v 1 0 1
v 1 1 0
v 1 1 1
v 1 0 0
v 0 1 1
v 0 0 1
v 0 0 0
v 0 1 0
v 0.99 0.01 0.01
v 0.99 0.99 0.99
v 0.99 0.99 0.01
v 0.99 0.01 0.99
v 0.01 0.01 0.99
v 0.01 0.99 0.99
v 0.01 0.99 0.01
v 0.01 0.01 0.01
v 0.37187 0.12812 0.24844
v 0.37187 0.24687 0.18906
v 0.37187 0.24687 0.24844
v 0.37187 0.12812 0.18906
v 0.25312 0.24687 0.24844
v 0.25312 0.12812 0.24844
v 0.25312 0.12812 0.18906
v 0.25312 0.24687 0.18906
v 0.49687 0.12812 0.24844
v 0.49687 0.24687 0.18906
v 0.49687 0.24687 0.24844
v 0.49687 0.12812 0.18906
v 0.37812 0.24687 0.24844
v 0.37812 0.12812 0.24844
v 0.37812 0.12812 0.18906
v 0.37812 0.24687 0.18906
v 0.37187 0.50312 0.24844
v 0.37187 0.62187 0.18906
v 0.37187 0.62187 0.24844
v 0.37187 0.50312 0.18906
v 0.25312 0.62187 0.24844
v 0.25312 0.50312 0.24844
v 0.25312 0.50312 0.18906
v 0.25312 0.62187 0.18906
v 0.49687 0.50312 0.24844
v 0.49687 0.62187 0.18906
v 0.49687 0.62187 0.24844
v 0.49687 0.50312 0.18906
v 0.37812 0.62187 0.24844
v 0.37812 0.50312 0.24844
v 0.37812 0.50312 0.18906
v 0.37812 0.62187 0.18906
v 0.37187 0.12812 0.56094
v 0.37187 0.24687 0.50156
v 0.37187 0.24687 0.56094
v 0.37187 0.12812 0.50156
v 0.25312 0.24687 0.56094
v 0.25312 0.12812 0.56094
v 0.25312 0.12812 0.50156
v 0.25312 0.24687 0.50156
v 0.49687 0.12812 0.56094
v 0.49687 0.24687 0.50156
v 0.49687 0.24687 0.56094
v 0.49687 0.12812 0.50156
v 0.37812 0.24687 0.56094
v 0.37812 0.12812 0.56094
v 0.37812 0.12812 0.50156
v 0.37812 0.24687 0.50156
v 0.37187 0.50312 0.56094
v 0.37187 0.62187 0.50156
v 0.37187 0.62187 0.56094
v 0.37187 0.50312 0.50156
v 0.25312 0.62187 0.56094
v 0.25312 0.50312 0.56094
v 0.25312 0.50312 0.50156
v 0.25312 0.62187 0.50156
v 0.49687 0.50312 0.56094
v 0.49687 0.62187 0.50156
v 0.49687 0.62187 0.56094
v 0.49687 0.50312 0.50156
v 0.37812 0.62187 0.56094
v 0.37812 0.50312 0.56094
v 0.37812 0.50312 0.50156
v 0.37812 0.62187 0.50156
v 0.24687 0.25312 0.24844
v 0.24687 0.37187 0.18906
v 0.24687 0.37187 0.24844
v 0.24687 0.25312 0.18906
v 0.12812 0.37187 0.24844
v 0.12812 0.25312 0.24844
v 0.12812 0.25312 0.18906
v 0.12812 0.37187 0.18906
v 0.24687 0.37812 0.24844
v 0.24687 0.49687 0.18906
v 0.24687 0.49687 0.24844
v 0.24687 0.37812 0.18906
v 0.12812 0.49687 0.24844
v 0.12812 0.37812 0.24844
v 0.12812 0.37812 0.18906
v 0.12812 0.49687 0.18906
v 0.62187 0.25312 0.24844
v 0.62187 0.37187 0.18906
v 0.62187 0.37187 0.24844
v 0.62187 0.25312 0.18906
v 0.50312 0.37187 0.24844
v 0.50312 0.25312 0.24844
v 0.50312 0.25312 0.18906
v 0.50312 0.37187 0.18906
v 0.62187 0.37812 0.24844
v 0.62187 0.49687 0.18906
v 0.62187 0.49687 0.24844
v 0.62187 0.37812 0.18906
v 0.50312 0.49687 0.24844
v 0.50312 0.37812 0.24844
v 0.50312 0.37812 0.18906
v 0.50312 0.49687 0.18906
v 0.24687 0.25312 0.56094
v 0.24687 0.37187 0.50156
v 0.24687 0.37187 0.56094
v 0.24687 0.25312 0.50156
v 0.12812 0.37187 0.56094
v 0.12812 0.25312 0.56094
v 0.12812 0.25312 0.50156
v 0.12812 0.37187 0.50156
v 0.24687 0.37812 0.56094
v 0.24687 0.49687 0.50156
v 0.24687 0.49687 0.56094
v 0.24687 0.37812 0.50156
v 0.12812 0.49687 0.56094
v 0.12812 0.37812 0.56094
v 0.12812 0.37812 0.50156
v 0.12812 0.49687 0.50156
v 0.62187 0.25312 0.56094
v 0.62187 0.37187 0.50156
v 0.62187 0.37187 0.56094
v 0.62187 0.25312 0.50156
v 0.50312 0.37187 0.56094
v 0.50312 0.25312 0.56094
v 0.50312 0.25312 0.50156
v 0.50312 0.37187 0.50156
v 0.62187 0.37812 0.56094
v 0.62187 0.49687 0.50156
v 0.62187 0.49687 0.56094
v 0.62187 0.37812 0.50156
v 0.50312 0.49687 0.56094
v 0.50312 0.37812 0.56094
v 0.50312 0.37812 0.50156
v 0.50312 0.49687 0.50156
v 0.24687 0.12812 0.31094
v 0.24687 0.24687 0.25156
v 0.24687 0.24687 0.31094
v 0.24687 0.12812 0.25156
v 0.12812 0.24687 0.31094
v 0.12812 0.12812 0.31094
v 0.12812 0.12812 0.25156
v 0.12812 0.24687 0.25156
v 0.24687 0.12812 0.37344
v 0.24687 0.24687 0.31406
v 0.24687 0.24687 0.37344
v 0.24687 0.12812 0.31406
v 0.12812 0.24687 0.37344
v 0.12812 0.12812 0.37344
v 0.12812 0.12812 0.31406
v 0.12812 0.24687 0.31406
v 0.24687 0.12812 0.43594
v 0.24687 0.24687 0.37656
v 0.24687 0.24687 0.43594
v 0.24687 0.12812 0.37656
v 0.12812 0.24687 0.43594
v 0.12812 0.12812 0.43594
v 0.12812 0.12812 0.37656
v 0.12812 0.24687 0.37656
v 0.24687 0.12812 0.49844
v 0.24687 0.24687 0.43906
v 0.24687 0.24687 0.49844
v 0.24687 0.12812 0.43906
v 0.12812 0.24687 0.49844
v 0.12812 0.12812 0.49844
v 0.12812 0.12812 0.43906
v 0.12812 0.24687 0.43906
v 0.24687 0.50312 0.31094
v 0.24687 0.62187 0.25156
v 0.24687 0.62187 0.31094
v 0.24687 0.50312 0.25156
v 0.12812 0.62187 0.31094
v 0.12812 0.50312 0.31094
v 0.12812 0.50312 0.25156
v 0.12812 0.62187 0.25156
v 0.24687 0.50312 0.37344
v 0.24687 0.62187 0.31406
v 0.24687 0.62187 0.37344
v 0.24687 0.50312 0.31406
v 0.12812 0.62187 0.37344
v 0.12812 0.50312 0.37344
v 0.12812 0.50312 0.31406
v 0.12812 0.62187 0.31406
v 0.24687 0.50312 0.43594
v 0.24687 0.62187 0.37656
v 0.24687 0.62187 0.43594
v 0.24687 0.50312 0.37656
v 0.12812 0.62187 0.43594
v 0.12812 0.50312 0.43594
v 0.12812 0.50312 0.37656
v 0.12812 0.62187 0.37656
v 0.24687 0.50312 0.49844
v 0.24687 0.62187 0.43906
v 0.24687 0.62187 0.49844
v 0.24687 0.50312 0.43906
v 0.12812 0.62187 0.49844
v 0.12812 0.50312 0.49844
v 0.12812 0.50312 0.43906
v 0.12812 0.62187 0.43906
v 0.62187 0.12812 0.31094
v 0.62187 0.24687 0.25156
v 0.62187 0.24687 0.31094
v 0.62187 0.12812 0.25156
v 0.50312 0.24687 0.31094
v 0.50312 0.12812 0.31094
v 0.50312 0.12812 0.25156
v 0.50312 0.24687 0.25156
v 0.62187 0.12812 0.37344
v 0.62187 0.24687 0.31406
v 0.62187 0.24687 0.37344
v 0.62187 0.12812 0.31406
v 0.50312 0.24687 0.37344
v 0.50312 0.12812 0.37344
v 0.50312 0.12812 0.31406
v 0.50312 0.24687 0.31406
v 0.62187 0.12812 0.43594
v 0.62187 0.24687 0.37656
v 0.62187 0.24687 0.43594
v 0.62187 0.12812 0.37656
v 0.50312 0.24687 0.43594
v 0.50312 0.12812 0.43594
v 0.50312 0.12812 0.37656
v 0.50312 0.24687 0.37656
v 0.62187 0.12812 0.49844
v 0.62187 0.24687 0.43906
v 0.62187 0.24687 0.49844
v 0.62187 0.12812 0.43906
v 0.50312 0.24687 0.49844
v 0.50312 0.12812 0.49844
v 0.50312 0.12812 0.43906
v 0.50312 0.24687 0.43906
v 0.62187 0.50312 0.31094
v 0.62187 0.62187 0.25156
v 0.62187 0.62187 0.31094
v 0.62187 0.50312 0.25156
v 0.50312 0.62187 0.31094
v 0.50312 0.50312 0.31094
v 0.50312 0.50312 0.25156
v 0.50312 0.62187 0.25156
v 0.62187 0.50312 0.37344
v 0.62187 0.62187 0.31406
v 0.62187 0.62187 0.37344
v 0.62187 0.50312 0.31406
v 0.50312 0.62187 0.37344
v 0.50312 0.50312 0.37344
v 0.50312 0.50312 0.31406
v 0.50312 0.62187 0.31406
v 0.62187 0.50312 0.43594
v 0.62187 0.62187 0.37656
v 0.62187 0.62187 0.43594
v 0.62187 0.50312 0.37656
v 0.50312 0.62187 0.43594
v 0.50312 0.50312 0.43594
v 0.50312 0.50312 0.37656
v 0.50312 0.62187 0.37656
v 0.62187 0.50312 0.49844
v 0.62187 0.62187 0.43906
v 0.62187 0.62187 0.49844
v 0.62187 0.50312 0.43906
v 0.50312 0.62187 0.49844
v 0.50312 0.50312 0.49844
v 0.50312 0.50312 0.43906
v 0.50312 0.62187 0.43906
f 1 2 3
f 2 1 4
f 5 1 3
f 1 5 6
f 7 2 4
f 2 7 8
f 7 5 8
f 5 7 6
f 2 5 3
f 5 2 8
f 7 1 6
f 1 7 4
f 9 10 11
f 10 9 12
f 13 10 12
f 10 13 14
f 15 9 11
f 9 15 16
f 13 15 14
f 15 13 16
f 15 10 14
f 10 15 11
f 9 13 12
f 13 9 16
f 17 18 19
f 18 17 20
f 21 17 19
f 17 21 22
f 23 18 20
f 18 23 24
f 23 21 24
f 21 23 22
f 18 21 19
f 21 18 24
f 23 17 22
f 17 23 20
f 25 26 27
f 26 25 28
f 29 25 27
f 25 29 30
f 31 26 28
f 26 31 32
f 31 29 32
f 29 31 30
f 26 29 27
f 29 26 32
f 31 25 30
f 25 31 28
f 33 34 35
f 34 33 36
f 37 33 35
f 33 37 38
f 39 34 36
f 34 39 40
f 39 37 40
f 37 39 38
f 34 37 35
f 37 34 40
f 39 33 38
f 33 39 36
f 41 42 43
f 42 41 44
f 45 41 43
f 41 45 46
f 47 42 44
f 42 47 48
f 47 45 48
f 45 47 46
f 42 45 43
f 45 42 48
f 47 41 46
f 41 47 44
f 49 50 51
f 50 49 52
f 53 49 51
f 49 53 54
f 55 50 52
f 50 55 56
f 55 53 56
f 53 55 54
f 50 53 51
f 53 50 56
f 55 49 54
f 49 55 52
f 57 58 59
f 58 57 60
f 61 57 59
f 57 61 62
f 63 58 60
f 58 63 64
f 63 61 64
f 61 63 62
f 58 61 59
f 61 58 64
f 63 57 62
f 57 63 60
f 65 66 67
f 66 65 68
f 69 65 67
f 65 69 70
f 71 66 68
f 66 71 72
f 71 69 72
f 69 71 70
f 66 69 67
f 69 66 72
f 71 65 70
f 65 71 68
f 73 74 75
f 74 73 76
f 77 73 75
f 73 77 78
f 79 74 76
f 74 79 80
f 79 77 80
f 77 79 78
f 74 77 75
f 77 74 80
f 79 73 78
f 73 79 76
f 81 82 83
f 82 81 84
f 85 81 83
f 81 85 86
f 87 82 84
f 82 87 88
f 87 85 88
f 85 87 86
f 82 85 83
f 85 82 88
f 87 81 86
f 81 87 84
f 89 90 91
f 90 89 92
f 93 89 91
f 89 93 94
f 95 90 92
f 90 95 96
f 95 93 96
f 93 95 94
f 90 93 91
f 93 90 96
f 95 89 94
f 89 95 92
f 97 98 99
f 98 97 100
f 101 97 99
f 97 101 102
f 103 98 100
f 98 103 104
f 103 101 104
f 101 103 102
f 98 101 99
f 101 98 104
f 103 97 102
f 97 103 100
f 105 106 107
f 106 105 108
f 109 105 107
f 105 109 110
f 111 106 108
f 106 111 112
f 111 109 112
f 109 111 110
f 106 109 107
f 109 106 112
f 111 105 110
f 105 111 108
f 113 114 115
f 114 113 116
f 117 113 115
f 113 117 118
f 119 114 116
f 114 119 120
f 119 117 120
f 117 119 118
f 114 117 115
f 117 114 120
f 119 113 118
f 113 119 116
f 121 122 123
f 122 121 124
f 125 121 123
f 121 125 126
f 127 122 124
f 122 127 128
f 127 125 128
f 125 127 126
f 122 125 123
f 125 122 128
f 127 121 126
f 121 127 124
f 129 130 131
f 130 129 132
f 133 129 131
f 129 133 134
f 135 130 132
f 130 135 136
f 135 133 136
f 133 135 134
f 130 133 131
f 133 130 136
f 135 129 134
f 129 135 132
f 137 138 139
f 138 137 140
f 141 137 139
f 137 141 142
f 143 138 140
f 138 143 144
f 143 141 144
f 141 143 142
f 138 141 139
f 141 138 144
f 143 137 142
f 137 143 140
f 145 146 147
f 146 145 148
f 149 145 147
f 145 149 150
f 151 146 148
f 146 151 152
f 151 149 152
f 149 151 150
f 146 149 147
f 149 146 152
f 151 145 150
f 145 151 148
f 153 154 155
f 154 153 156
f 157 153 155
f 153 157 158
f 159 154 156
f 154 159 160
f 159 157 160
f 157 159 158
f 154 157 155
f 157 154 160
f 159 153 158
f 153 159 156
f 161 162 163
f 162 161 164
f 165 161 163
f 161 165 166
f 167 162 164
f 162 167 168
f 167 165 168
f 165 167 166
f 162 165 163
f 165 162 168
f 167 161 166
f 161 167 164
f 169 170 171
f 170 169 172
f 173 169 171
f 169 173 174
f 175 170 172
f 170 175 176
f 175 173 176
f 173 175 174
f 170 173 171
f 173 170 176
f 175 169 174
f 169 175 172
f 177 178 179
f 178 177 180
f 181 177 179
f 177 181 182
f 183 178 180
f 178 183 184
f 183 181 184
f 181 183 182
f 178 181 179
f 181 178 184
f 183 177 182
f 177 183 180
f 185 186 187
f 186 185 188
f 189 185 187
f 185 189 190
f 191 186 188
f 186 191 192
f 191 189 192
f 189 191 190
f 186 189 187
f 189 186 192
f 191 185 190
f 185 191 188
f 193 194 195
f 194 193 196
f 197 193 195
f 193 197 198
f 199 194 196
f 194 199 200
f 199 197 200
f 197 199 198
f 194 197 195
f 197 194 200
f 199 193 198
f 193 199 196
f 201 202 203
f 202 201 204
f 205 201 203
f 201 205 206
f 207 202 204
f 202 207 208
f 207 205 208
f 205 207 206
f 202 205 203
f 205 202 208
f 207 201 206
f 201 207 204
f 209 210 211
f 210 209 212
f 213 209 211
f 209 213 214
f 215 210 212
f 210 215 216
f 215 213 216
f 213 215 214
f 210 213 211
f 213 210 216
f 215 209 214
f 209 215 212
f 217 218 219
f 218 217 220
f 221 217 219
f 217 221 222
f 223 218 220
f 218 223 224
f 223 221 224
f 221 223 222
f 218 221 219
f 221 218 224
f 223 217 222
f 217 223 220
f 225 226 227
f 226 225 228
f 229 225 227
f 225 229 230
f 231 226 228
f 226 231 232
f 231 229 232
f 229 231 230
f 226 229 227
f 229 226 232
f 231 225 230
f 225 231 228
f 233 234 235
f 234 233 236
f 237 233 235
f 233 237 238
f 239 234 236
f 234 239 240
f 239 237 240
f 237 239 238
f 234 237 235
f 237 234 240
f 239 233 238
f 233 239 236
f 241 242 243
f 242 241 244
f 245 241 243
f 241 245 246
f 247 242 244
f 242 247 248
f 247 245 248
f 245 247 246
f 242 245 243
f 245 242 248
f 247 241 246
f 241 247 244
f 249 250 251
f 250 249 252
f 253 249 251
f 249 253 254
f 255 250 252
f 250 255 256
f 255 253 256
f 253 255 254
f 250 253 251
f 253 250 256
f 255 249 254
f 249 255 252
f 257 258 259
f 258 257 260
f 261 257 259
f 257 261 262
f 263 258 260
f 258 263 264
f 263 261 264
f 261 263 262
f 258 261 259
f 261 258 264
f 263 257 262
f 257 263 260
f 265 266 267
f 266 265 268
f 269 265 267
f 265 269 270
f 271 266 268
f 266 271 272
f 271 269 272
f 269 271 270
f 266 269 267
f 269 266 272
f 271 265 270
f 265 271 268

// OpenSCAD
translate([0.3125, 0.1875, 0.21875]) color([0.6037583803803824, 0.09238807015612271, 0.4419558762620379]) cube([0.11875, 0.11875, 0.059375], center=true);
translate([0.4375, 0.1875, 0.21875]) color([0.6420780553975034, 0.6088601398564771, 0.7006829729581248]) cube([0.11875, 0.11875, 0.059375], center=true);
translate([0.3125, 0.5625, 0.21875]) color([0.7581305576304872, 0.007750557804180436, 0.3766814086539222]) cube([0.11875, 0.11875, 0.059375], center=true);
translate([0.4375, 0.5625, 0.21875]) color([0.5480572348527447, 0.764494351432422, 0.23597579287557113]) cube([0.11875, 0.11875, 0.059375], center=true);
translate([0.3125, 0.1875, 0.53125]) color([0.2693649322151713, 0.2694086766238075, 0.6958796859861389]) cube([0.11875, 0.11875, 0.059375], center=true);
translate([0.4375, 0.1875, 0.53125]) color([0.25761969812780583, 0.5682717090181436, 0.22865906317287465]) cube([0.11875, 0.11875, 0.059375], center=true);
translate([0.3125, 0.5625, 0.53125]) color([0.1400455665979884, 0.021159789998606793, 0.7153680697513951]) cube([0.11875, 0.11875, 0.059375], center=true);
translate([0.4375, 0.5625, 0.53125]) color([0.901009207148188, 0.2844876572861873, 0.634268133483926]) cube([0.11875, 0.11875, 0.059375], center=true);
translate([0.1875, 0.3125, 0.21875]) color([0.7727777887413428, 0.029821551784454114, 0.23525397340278087]) cube([0.11875, 0.11875, 0.059375], center=true);
translate([0.1875, 0.4375, 0.21875]) color([0.29625533864232734, 0.987650008265469, 0.04068443442601799]) cube([0.11875, 0.11875, 0.059375], center=true);
translate([0.5625, 0.3125, 0.21875]) color([0.22341283147923674, 0.40291300475301783, 0.6189361131964184]) cube([0.11875, 0.11875, 0.059375], center=true);
translate([0.5625, 0.4375, 0.21875]) color([0.32098093132393746, 0.5382746099882824, 0.8431342716015308]) cube([0.11875, 0.11875, 0.059375], center=true);
translate([0.1875, 0.3125, 0.53125]) color([0.12127558406527117, 0.7951164917864636, 0.39223977748645245]) cube([0.11875, 0.11875, 0.059375], center=true);
translate([0.1875, 0.4375, 0.53125]) color([0.8130994088483475, 0.15894878261464274, 0.9790192350809205]) cube([0.11875, 0.11875, 0.059375], center=true);
translate([0.5625, 0.3125, 0.53125]) color([0.8594904379198878, 0.527164370948916, 0.6281707866208207]) cube([0.11875, 0.11875, 0.059375], center=true);
translate([0.5625, 0.4375, 0.53125]) color([0.287973529133251, 0.886126437430738, 0.5869840703034822]) cube([0.11875, 0.11875, 0.059375], center=true);
translate([0.1875, 0.1875, 0.28125]) color([0.43596179780365907, 0.27777227278728744, 0.14933550433499432]) cube([0.11875, 0.11875, 0.059375], center=true);
translate([0.1875, 0.1875, 0.34375]) color([0.24214575376493663, 0.7099966356239097, 0.23619105890966297]) cube([0.11875, 0.11875, 0.059375], center=true);
translate([0.1875, 0.1875, 0.40625]) color([0.9484277570129899, 0.016239817055838657, 0.005610540076387949]) cube([0.11875, 0.11875, 0.059375], center=true);
translate([0.1875, 0.1875, 0.46875]) color([0.0970230099071091, 0.2795817869139515, 0.16811954627213588]) cube([0.11875, 0.11875, 0.059375], center=true);
translate([0.1875, 0.5625, 0.28125]) color([0.25092783002109176, 0.8587529002767683, 0.8440271640533732]) cube([0.11875, 0.11875, 0.059375], center=true);
translate([0.1875, 0.5625, 0.34375]) color([0.3332331778602836, 0.5745321225009682, 0.597981660562659]) cube([0.11875, 0.11875, 0.059375], center=true);
translate([0.1875, 0.5625, 0.40625]) color([0.08701921327081541, 0.5549385198079445, 0.2882594546124603]) cube([0.11875, 0.11875, 0.059375], center=true);
translate([0.1875, 0.5625, 0.46875]) color([0.04706486917389552, 0.8755978412272422, 0.2767090522626785]) cube([0.11875, 0.11875, 0.059375], center=true);
translate([0.5625, 0.1875, 0.28125]) color([0.05516803830106254, 0.46174511102973437, 0.7545684835431763]) cube([0.11875, 0.11875, 0.059375], center=true);
translate([0.5625, 0.1875, 0.34375]) color([0.9296410941751805, 0.09779858722067658, 0.6642861600569387]) cube([0.11875, 0.11875, 0.059375], center=true);
translate([0.5625, 0.1875, 0.40625]) color([0.4824392270731599, 0.8361939221877871, 0.8310992059871917]) cube([0.11875, 0.11875, 0.059375], center=true);
translate([0.5625, 0.1875, 0.46875]) color([0.9392596196232026, 0.12297518776699823, 0.9119465849354247]) cube([0.11875, 0.11875, 0.059375], center=true);
translate([0.5625, 0.5625, 0.28125]) color([0.6861712480416268, 0.26385439008870304, 0.536183529695636]) cube([0.11875, 0.11875, 0.059375], center=true);
translate([0.5625, 0.5625, 0.34375]) color([0.028230652789332455, 0.6052676826541201, 0.369439565835034]) cube([0.11875, 0.11875, 0.059375], center=true);
translate([0.5625, 0.5625, 0.40625]) color([0.45153480987563877, 0.48698698819473707, 0.28726291748041466]) cube([0.11875, 0.11875, 0.059375], center=true);
translate([0.5625, 0.5625, 0.46875]) color([0.5764130018650396, 0.40982184079246864, 0.9791724814701669]) cube([0.11875, 0.11875, 0.059375], center=true);
color([0.3,0.3,0.3,0.3]) difference() { cube([1,1,1]); translate([0.01,0.01,0.01]) cube([0.98,0.98,0.98]); }
